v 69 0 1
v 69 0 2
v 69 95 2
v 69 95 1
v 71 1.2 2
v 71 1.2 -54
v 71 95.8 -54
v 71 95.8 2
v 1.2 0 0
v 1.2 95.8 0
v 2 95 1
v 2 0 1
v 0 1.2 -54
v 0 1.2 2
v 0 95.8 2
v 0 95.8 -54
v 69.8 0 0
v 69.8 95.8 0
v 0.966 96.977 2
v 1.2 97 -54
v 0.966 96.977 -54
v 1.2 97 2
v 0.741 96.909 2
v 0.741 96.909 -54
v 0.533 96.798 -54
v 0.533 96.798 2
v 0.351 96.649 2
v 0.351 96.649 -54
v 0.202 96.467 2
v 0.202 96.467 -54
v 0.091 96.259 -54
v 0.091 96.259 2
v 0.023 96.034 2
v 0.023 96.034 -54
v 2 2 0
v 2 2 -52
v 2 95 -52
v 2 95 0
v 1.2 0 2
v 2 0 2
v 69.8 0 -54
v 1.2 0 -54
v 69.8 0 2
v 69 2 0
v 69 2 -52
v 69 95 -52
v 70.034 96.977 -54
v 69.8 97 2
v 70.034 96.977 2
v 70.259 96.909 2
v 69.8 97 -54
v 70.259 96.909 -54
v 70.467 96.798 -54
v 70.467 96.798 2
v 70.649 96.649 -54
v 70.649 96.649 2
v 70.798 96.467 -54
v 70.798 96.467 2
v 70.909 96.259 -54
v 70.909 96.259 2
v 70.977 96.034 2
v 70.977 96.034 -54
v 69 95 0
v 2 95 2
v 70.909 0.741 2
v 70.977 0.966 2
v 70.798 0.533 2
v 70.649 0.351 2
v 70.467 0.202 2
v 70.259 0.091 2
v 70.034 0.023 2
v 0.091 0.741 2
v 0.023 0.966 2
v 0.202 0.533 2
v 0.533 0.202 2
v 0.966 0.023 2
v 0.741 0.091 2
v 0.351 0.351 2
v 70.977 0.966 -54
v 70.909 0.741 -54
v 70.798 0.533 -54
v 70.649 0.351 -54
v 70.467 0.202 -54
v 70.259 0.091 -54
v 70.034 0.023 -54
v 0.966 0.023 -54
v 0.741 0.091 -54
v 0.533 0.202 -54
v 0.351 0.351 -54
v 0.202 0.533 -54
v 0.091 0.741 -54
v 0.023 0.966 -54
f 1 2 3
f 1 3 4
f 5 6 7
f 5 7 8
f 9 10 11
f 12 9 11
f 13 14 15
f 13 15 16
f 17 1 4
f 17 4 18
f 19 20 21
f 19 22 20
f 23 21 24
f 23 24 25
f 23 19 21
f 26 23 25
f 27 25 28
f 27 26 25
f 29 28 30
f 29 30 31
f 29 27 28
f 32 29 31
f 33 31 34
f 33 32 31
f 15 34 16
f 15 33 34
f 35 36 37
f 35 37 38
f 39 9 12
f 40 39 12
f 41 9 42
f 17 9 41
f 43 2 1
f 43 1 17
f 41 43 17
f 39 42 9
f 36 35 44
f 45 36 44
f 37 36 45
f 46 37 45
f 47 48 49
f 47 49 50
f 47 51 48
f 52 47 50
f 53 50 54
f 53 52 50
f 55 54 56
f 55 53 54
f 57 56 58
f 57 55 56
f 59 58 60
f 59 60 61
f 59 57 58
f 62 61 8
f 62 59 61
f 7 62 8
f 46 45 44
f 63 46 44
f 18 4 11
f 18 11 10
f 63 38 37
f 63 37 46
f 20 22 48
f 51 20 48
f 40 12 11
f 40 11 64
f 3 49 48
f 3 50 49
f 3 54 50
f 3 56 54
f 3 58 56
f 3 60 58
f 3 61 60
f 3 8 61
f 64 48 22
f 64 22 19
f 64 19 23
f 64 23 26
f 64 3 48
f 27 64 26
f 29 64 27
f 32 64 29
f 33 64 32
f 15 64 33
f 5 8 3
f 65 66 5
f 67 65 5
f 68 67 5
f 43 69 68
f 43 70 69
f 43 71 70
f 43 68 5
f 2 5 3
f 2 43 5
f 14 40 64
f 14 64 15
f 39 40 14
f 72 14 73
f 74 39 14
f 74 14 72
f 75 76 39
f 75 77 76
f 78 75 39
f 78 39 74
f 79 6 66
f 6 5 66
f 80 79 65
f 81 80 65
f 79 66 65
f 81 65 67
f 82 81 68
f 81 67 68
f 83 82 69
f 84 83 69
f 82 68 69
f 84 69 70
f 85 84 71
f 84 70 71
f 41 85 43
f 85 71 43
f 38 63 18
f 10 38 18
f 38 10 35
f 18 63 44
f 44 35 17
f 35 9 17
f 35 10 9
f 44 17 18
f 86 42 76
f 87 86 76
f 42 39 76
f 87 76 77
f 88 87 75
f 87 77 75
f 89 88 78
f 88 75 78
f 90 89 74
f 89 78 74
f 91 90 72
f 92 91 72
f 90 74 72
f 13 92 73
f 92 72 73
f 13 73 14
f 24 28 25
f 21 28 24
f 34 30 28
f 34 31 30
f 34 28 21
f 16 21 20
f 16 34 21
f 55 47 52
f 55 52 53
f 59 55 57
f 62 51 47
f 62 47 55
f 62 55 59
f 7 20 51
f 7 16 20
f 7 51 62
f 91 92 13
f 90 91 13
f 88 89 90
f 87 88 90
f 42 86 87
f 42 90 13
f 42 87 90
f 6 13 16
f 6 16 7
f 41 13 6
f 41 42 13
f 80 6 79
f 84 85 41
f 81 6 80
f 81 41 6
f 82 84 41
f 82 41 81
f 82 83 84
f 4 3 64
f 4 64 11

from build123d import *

# Parameters (mm, degrees)
F0_W     = 71
F0_H     = 54
F1_DEPTH = 97
F2_T     = -2
F4_DEPTH = 97
F6_DEPTH = 71
F7_R     = 1.19999


# Not quite as in the source:
# - a fillet or chamfer is up to 0.001 mm smaller than in the source, because OpenCascade refuses the exact size


with BuildPart() as f1:
    # F0 (on Front) → F1 (new body)
    with BuildSketch(Plane.XZ):
        with Locations((35.5, -27)):
            Rectangle(F0_W, F0_H)
    extrude(amount=-F1_DEPTH)

    # F2
    f2_openings = [f1.faces().sort_by_distance(p)[0] for p in [
        (35.5, 48.5, 0),
    ]]
    offset(amount=F2_T, openings=f2_openings)

    # F3 (on face) → F4 (join, through all)
    with BuildSketch(Plane.XZ):
        Polygon((0, 2), (0, 0), (1.2, 0), (2, 1), (2, 2), align=None)
        Polygon((69, 1), (69.8, 0), (71, 0), (71, 2), (69, 2), align=None)
    extrude(amount=-F4_DEPTH)

    # F5 (on face) → F6 (join, through all)
    with BuildSketch(Plane.YZ.offset(71)):
        Polygon((97, 0), (97, 2), (95, 2), (95, 1), (95.8, 0), align=None)
    extrude(amount=-F6_DEPTH)

    # F7 (radius 1.2 in the source; OpenCascade refuses exactly that, so slightly less here)
    f7_edges = [f1.edges().sort_by_distance(p)[0] for p in [
        (71, 0, -26),
        (71, 97, -26),
        (0, 0, -26),
        (0, 97, -26),
    ]]
    fillet(f7_edges, radius=F7_R)


solid = f1.part
